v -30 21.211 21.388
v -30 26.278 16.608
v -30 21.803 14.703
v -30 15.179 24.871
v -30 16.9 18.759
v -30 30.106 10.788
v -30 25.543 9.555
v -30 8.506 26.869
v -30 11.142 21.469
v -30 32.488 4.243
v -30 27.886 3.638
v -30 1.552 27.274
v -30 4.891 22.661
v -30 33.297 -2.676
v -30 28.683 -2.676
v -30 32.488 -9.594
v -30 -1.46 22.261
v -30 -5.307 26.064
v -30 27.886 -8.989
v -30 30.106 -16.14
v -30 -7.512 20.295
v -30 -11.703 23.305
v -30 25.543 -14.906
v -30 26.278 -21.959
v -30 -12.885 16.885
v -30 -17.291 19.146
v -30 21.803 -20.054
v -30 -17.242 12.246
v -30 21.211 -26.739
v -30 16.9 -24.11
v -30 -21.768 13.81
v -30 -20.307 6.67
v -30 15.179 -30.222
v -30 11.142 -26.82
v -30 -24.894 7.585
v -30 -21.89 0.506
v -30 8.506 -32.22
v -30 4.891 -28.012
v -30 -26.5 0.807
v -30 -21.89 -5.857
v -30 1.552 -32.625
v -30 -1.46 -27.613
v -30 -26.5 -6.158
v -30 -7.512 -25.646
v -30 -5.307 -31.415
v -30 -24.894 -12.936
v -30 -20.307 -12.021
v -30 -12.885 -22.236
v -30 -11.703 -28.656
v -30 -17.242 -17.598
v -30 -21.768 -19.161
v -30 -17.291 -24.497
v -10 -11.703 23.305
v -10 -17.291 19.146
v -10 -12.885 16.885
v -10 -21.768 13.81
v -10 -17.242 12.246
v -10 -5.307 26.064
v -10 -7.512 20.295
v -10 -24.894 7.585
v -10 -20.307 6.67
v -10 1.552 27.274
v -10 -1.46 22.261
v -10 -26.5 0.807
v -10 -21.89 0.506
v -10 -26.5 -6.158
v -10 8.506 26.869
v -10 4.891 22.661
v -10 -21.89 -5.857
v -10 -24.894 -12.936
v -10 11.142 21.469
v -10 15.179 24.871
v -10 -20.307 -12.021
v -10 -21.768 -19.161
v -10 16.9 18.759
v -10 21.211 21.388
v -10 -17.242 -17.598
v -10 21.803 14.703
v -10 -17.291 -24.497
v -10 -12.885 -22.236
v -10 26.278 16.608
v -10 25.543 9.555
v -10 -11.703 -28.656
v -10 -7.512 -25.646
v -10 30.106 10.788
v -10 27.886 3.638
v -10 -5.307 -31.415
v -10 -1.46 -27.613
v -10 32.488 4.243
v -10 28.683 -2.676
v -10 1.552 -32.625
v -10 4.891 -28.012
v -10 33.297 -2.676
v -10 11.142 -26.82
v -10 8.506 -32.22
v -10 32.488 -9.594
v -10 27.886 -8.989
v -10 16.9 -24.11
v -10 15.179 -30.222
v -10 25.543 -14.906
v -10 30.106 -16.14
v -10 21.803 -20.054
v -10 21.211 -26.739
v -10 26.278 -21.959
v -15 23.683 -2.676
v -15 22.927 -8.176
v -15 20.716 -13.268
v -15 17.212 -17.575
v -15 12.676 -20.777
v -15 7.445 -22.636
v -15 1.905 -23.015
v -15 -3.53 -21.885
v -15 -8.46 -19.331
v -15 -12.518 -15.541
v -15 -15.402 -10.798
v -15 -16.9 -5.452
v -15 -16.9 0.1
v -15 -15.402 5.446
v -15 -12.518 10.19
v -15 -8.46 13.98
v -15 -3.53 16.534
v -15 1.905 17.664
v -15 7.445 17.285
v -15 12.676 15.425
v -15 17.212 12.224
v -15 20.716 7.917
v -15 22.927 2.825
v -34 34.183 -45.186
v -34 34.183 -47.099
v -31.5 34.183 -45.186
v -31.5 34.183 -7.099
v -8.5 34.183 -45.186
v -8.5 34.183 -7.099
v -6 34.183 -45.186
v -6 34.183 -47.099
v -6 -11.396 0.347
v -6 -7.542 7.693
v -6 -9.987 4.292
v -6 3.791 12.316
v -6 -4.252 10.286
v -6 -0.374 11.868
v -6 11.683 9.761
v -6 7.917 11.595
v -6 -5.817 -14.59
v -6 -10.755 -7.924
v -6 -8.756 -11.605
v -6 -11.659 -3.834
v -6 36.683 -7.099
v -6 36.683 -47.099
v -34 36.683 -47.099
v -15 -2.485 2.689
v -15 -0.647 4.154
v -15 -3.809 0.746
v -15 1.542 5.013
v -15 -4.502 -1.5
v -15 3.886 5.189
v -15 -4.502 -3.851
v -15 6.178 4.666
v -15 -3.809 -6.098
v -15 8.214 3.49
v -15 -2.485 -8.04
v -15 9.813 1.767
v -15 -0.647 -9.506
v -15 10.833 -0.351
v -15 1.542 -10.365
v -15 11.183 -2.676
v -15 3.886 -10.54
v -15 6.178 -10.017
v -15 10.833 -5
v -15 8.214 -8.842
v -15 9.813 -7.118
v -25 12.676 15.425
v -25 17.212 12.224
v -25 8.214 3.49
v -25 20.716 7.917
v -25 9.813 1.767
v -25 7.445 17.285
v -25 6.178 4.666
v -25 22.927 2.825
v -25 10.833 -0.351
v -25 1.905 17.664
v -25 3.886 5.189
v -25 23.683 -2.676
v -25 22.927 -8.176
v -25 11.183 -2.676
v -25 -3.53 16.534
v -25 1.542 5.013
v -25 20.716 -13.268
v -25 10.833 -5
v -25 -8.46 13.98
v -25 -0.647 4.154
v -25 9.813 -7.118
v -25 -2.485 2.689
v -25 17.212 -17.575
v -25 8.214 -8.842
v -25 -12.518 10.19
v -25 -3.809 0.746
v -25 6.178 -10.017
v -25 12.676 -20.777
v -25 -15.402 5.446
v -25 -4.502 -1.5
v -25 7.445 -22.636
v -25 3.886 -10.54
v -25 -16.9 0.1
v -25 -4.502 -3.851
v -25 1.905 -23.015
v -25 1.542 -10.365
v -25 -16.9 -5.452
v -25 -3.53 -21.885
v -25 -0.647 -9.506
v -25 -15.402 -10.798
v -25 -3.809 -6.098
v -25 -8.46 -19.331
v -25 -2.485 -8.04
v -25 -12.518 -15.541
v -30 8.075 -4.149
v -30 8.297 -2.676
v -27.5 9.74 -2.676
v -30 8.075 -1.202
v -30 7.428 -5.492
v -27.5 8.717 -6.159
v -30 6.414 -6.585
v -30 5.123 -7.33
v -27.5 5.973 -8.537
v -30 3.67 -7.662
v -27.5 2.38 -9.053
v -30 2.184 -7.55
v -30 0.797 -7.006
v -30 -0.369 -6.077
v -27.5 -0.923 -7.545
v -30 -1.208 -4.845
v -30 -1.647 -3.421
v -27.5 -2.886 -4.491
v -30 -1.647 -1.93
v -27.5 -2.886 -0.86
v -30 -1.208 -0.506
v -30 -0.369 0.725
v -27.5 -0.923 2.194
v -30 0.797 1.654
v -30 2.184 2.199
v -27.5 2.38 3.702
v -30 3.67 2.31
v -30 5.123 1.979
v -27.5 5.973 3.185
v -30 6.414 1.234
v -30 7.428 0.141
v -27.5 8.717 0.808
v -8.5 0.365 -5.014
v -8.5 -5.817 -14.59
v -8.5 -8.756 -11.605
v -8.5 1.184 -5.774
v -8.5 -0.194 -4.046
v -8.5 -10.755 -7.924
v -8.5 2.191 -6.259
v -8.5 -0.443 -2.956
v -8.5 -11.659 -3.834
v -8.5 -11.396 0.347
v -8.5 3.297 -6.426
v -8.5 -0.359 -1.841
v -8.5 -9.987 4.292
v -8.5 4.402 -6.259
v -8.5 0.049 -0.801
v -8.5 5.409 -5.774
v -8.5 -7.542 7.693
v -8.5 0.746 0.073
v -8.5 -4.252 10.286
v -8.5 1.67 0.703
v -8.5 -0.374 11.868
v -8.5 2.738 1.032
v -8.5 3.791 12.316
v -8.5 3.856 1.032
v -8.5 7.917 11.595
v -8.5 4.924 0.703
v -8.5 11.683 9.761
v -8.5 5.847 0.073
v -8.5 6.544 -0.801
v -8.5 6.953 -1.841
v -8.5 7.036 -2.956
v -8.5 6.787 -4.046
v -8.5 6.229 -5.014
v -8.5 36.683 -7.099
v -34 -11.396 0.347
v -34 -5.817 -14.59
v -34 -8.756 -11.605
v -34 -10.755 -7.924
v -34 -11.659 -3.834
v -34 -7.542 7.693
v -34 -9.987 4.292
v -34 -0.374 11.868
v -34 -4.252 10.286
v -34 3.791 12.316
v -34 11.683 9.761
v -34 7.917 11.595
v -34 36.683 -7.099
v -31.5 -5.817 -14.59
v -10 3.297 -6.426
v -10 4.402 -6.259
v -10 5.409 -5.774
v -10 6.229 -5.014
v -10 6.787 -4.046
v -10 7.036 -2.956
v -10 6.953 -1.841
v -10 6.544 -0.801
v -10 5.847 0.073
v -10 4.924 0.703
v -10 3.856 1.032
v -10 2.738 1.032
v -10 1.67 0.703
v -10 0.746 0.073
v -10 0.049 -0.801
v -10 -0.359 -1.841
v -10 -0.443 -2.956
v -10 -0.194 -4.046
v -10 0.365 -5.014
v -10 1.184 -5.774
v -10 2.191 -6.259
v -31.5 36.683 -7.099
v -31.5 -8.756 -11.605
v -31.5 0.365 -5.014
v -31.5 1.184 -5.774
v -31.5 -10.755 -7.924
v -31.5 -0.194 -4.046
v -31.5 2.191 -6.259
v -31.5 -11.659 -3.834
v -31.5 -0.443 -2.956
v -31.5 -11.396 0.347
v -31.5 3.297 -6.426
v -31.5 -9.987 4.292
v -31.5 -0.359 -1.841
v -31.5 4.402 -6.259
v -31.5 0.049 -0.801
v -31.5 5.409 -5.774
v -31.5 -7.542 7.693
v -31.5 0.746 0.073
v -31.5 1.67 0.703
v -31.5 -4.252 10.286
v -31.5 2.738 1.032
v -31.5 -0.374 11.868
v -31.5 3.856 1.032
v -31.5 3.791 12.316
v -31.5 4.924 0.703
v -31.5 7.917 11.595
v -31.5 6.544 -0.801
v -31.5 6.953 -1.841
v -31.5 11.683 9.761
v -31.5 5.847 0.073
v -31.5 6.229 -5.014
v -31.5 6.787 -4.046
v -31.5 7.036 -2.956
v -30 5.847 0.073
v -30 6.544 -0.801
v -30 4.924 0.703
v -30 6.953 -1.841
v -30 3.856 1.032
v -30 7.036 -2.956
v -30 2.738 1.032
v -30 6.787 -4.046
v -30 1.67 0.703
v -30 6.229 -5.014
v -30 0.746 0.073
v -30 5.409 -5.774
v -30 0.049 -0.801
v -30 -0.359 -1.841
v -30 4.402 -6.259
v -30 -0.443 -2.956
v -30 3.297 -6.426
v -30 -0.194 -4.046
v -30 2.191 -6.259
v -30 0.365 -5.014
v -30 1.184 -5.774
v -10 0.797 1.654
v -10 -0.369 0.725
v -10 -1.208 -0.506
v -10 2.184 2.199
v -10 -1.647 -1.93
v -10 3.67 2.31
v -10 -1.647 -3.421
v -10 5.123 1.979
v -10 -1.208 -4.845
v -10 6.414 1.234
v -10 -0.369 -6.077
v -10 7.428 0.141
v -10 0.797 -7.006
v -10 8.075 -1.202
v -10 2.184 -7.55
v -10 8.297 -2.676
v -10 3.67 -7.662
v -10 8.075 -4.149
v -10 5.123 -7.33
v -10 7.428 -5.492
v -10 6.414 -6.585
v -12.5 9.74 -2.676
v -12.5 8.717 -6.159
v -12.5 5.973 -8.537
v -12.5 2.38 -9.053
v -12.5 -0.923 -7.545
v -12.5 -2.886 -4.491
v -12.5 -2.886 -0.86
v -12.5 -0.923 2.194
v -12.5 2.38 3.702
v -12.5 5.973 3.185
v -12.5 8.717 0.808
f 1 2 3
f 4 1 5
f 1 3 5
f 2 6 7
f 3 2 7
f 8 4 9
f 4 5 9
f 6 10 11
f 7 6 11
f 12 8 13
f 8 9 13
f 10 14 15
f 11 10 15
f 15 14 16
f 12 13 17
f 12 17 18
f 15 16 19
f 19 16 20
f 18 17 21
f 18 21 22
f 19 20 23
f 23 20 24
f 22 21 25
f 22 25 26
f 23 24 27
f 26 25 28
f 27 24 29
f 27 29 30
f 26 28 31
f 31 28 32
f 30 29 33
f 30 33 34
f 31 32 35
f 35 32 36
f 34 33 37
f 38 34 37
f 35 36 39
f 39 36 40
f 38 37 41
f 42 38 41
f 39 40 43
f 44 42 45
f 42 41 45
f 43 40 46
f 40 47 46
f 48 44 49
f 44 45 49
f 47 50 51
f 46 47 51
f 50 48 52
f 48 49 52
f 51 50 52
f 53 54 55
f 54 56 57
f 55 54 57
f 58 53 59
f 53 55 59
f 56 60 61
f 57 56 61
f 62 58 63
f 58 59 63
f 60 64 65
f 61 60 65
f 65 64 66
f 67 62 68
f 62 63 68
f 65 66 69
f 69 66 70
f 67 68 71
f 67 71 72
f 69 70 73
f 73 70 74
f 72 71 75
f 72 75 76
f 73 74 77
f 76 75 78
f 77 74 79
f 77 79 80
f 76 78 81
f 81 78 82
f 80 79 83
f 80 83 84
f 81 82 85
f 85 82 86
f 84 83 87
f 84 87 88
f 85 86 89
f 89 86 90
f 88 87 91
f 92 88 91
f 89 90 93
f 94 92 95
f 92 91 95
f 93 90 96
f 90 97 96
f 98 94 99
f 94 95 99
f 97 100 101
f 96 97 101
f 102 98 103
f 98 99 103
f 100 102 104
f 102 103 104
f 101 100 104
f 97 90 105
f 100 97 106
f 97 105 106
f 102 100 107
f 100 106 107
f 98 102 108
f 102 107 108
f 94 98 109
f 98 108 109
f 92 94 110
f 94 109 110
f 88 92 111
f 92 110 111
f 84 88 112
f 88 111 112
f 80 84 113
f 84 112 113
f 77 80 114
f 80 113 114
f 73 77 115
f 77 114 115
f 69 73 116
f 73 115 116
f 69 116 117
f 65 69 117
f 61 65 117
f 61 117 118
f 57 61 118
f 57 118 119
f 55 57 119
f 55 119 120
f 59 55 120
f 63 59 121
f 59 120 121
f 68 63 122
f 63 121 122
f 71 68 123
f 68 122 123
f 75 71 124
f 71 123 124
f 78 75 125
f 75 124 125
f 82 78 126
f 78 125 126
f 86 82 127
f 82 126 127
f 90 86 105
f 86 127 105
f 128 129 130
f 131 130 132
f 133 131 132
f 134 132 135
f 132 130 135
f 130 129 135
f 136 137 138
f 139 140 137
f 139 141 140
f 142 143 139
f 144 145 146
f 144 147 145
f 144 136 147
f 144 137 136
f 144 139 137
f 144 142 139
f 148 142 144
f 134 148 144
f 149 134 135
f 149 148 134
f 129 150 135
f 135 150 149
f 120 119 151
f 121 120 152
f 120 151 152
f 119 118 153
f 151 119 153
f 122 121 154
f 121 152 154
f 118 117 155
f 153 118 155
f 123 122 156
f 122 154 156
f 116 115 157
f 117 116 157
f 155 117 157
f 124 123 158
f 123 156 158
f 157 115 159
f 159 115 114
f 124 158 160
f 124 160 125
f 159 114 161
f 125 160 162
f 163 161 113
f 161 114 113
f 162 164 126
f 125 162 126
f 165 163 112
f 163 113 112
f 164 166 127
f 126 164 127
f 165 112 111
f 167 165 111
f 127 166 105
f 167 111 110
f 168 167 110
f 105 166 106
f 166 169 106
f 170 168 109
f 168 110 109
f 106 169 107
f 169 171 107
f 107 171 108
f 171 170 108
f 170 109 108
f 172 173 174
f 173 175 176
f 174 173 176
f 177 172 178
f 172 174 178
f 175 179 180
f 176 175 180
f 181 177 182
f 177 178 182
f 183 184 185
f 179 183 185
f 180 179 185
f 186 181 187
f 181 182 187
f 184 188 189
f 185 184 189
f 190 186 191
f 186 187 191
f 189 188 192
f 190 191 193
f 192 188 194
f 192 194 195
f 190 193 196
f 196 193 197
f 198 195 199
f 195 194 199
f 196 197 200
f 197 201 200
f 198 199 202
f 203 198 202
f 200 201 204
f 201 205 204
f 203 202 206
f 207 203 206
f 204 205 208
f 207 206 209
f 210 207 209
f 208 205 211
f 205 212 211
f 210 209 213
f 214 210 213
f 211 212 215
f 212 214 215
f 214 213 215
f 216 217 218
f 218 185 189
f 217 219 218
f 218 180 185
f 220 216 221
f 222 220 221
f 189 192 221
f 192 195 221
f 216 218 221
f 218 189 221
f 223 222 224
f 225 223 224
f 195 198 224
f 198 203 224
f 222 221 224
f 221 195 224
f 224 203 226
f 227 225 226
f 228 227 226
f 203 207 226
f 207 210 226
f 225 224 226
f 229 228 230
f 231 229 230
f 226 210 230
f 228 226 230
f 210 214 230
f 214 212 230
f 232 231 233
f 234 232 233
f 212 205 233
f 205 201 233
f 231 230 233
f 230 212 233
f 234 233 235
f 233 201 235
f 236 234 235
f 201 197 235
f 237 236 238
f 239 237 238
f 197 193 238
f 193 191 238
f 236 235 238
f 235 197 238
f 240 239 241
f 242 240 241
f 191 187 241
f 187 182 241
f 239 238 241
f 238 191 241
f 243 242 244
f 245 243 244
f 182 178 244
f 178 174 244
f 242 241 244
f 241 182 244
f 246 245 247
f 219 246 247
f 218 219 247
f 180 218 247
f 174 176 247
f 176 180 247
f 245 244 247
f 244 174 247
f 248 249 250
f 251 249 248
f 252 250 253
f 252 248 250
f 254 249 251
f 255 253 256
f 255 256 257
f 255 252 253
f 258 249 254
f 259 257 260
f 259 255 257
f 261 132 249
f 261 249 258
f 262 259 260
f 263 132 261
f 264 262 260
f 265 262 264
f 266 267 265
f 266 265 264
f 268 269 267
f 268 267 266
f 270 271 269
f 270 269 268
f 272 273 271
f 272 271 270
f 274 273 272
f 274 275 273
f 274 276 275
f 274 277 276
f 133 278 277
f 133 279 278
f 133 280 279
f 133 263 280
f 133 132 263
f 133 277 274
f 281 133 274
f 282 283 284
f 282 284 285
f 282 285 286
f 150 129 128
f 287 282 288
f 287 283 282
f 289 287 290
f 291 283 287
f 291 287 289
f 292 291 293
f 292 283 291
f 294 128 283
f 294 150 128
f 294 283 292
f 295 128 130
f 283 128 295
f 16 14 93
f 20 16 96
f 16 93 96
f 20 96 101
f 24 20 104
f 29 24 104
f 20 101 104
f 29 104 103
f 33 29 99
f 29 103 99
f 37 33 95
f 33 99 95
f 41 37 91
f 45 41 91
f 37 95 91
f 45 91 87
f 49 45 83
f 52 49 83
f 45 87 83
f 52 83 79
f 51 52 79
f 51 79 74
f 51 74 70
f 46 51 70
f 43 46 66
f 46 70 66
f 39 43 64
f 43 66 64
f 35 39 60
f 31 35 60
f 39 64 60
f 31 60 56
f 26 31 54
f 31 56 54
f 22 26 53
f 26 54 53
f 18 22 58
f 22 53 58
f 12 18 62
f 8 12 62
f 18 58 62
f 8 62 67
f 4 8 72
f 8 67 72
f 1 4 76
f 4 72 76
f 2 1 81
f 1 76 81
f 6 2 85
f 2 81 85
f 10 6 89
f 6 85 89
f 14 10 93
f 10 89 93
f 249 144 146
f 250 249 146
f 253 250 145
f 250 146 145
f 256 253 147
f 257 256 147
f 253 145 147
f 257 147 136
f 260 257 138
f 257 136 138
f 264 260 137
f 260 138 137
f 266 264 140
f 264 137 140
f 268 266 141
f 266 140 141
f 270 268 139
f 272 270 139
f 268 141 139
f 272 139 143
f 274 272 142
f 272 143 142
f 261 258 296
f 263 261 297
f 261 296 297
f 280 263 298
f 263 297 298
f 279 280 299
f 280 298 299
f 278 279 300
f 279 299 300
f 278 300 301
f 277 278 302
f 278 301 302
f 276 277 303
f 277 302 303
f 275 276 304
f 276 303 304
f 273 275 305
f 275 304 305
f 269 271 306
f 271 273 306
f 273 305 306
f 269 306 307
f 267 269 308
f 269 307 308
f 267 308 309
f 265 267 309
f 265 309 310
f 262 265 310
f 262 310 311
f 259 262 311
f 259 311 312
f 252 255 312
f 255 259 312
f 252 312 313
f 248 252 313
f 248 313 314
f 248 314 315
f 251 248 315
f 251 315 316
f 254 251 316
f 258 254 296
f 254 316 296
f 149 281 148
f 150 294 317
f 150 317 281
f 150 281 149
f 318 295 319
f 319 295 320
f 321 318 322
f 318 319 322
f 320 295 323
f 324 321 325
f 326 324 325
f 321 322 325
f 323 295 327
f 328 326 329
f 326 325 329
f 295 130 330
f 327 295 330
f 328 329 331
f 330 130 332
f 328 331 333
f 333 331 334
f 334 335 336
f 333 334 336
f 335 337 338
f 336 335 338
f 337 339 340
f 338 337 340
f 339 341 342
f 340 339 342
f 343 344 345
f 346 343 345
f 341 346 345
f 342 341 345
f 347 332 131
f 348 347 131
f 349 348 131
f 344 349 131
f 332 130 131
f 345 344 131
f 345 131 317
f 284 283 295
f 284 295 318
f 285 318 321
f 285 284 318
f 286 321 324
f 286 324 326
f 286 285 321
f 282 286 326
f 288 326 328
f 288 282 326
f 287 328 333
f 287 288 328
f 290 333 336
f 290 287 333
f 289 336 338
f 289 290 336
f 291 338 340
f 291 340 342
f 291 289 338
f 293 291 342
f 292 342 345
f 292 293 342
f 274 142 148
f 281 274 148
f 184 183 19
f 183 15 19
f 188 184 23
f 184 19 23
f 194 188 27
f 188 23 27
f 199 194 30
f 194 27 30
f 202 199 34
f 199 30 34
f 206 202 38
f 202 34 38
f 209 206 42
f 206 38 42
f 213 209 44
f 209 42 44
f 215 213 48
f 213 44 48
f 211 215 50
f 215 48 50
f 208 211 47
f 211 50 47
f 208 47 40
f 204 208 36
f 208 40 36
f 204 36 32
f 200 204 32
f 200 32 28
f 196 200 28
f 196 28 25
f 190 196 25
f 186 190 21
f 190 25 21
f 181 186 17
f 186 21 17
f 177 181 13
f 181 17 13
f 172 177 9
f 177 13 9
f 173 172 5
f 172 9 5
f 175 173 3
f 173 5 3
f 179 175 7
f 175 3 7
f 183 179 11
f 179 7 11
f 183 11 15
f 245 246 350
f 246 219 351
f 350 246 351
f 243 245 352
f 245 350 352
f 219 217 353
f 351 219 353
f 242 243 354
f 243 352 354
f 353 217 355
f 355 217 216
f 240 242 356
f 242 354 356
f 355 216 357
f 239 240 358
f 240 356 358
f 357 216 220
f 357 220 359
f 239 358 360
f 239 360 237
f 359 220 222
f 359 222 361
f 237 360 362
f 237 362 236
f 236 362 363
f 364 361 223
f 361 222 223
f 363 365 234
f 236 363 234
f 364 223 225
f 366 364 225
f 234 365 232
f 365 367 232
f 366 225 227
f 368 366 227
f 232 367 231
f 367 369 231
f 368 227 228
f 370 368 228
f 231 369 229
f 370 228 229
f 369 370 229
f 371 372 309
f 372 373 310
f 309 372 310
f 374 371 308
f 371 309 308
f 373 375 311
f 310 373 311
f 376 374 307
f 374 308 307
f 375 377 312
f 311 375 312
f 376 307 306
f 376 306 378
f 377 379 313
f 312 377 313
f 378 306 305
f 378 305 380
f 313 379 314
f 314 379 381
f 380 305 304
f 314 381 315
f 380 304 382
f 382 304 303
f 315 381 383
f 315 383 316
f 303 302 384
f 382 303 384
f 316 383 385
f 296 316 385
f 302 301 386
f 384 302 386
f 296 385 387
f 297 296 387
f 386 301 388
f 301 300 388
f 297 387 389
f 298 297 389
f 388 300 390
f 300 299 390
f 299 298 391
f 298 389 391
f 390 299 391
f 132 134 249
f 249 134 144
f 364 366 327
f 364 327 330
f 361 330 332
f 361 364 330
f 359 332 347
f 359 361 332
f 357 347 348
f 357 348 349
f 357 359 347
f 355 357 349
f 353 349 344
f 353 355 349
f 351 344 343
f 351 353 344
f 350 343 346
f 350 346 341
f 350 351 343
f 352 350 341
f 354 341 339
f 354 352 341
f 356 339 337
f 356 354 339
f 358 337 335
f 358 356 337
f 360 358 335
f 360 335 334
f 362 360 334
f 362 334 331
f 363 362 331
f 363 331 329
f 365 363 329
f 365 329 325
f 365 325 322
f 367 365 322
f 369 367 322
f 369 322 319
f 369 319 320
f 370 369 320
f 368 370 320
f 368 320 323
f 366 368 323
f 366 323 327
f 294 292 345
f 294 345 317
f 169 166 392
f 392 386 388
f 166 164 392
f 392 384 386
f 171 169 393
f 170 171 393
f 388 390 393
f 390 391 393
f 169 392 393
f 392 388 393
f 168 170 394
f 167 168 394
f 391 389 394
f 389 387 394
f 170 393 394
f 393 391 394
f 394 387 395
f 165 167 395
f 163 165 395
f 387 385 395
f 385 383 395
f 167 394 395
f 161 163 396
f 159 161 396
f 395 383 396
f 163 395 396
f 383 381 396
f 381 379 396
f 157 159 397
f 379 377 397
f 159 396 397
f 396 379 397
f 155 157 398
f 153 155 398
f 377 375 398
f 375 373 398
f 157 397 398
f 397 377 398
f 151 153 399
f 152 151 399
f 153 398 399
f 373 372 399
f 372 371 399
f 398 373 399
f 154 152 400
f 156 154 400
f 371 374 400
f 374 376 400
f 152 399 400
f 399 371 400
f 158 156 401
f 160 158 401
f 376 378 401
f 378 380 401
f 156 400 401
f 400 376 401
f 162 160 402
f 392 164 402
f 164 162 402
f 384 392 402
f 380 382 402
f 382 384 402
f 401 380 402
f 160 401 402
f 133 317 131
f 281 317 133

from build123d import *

# Parameters (mm, degrees)
SKETCH3_R           = 7.5
BOSS_EXTRUDE1_DEPTH = 8
BOSS_EXTRUDE2_DEPTH = 5
SKETCH5_W           = 56
SKETCH5_H           = 80
BOSS_EXTRUDE3_DEPTH = 5
SCALE1_SCALE        = 0.5


with BuildPart() as part:
    # Sketch1 → Revolve1 (revolve)
    with BuildSketch(Plane.XY):
        Polygon((-40, 60), (0, 60), (0, 50.773502692), (-10, 40.773502692), (-10, 15.773502692), (0, 10), (0, 0), (-40, 0), (-40, 10), (-30, 15.773502692), (-30, 40.773502692), (-40, 50.773502692), align=None)
    revolve(axis=Axis((0, 0, 0), (-1, 0, 0)))

    # Sketch3 → Boss-Extrude1 (add)
    with BuildSketch(Plane(origin=(0, 0, 0), x_dir=(0, 0, -1), z_dir=(1, 0, 0))):
        Circle(SKETCH3_R)
    boss_extrude1 = extrude(amount=BOSS_EXTRUDE1_DEPTH)

    # Sketch4 → Boss-Extrude2 (add)
    with BuildSketch(Plane(origin=(8, 0, 0), x_dir=(0, 0, -1), z_dir=(1, 0, 0))):
        with BuildLine():
            Line((8.84577787, 66.773419664), (88.84577787, 66.773419664))
            Line((88.84577787, 66.773419664), (23.828381591, -18.226580336))
            ThreePointArc((23.828381591, -18.226580336), (-17.50778863, -24.361390299), (-24.872723871, 16.773419664))
            Line((-24.872723871, 16.773419664), (8.84577787, 66.773419664))
        make_face()
    boss_extrude2 = extrude(amount=-BOSS_EXTRUDE2_DEPTH)

    # Mirror1: Boss-Extrude1, Boss-Extrude2 across plane
    add(boss_extrude1.mirror(Plane(origin=(-20, 0, 0), x_dir=(0, 0, 1), z_dir=(1, 0, 0))))
    add(boss_extrude2.mirror(Plane(origin=(-20, 0, 0), x_dir=(0, 0, 1), z_dir=(1, 0, 0))))

    # Sketch5 → Boss-Extrude3 (add)
    with BuildSketch(Plane(origin=(0, 66.773419664, 0), x_dir=(1, 0, 0), z_dir=(0, 1, 0))):
        with Locations((-20, 48.84577787)):
            Rectangle(SKETCH5_W, SKETCH5_H)
    extrude(amount=-BOSS_EXTRUDE3_DEPTH)


with BuildPart() as part_1:
    # Scale1: scaled about (-20, 6.593417993, -5.351287219)
    add(part.part.scale(SCALE1_SCALE).moved(Location((-10, 3.296708997, -2.675643609))))


solid = part_1.part
